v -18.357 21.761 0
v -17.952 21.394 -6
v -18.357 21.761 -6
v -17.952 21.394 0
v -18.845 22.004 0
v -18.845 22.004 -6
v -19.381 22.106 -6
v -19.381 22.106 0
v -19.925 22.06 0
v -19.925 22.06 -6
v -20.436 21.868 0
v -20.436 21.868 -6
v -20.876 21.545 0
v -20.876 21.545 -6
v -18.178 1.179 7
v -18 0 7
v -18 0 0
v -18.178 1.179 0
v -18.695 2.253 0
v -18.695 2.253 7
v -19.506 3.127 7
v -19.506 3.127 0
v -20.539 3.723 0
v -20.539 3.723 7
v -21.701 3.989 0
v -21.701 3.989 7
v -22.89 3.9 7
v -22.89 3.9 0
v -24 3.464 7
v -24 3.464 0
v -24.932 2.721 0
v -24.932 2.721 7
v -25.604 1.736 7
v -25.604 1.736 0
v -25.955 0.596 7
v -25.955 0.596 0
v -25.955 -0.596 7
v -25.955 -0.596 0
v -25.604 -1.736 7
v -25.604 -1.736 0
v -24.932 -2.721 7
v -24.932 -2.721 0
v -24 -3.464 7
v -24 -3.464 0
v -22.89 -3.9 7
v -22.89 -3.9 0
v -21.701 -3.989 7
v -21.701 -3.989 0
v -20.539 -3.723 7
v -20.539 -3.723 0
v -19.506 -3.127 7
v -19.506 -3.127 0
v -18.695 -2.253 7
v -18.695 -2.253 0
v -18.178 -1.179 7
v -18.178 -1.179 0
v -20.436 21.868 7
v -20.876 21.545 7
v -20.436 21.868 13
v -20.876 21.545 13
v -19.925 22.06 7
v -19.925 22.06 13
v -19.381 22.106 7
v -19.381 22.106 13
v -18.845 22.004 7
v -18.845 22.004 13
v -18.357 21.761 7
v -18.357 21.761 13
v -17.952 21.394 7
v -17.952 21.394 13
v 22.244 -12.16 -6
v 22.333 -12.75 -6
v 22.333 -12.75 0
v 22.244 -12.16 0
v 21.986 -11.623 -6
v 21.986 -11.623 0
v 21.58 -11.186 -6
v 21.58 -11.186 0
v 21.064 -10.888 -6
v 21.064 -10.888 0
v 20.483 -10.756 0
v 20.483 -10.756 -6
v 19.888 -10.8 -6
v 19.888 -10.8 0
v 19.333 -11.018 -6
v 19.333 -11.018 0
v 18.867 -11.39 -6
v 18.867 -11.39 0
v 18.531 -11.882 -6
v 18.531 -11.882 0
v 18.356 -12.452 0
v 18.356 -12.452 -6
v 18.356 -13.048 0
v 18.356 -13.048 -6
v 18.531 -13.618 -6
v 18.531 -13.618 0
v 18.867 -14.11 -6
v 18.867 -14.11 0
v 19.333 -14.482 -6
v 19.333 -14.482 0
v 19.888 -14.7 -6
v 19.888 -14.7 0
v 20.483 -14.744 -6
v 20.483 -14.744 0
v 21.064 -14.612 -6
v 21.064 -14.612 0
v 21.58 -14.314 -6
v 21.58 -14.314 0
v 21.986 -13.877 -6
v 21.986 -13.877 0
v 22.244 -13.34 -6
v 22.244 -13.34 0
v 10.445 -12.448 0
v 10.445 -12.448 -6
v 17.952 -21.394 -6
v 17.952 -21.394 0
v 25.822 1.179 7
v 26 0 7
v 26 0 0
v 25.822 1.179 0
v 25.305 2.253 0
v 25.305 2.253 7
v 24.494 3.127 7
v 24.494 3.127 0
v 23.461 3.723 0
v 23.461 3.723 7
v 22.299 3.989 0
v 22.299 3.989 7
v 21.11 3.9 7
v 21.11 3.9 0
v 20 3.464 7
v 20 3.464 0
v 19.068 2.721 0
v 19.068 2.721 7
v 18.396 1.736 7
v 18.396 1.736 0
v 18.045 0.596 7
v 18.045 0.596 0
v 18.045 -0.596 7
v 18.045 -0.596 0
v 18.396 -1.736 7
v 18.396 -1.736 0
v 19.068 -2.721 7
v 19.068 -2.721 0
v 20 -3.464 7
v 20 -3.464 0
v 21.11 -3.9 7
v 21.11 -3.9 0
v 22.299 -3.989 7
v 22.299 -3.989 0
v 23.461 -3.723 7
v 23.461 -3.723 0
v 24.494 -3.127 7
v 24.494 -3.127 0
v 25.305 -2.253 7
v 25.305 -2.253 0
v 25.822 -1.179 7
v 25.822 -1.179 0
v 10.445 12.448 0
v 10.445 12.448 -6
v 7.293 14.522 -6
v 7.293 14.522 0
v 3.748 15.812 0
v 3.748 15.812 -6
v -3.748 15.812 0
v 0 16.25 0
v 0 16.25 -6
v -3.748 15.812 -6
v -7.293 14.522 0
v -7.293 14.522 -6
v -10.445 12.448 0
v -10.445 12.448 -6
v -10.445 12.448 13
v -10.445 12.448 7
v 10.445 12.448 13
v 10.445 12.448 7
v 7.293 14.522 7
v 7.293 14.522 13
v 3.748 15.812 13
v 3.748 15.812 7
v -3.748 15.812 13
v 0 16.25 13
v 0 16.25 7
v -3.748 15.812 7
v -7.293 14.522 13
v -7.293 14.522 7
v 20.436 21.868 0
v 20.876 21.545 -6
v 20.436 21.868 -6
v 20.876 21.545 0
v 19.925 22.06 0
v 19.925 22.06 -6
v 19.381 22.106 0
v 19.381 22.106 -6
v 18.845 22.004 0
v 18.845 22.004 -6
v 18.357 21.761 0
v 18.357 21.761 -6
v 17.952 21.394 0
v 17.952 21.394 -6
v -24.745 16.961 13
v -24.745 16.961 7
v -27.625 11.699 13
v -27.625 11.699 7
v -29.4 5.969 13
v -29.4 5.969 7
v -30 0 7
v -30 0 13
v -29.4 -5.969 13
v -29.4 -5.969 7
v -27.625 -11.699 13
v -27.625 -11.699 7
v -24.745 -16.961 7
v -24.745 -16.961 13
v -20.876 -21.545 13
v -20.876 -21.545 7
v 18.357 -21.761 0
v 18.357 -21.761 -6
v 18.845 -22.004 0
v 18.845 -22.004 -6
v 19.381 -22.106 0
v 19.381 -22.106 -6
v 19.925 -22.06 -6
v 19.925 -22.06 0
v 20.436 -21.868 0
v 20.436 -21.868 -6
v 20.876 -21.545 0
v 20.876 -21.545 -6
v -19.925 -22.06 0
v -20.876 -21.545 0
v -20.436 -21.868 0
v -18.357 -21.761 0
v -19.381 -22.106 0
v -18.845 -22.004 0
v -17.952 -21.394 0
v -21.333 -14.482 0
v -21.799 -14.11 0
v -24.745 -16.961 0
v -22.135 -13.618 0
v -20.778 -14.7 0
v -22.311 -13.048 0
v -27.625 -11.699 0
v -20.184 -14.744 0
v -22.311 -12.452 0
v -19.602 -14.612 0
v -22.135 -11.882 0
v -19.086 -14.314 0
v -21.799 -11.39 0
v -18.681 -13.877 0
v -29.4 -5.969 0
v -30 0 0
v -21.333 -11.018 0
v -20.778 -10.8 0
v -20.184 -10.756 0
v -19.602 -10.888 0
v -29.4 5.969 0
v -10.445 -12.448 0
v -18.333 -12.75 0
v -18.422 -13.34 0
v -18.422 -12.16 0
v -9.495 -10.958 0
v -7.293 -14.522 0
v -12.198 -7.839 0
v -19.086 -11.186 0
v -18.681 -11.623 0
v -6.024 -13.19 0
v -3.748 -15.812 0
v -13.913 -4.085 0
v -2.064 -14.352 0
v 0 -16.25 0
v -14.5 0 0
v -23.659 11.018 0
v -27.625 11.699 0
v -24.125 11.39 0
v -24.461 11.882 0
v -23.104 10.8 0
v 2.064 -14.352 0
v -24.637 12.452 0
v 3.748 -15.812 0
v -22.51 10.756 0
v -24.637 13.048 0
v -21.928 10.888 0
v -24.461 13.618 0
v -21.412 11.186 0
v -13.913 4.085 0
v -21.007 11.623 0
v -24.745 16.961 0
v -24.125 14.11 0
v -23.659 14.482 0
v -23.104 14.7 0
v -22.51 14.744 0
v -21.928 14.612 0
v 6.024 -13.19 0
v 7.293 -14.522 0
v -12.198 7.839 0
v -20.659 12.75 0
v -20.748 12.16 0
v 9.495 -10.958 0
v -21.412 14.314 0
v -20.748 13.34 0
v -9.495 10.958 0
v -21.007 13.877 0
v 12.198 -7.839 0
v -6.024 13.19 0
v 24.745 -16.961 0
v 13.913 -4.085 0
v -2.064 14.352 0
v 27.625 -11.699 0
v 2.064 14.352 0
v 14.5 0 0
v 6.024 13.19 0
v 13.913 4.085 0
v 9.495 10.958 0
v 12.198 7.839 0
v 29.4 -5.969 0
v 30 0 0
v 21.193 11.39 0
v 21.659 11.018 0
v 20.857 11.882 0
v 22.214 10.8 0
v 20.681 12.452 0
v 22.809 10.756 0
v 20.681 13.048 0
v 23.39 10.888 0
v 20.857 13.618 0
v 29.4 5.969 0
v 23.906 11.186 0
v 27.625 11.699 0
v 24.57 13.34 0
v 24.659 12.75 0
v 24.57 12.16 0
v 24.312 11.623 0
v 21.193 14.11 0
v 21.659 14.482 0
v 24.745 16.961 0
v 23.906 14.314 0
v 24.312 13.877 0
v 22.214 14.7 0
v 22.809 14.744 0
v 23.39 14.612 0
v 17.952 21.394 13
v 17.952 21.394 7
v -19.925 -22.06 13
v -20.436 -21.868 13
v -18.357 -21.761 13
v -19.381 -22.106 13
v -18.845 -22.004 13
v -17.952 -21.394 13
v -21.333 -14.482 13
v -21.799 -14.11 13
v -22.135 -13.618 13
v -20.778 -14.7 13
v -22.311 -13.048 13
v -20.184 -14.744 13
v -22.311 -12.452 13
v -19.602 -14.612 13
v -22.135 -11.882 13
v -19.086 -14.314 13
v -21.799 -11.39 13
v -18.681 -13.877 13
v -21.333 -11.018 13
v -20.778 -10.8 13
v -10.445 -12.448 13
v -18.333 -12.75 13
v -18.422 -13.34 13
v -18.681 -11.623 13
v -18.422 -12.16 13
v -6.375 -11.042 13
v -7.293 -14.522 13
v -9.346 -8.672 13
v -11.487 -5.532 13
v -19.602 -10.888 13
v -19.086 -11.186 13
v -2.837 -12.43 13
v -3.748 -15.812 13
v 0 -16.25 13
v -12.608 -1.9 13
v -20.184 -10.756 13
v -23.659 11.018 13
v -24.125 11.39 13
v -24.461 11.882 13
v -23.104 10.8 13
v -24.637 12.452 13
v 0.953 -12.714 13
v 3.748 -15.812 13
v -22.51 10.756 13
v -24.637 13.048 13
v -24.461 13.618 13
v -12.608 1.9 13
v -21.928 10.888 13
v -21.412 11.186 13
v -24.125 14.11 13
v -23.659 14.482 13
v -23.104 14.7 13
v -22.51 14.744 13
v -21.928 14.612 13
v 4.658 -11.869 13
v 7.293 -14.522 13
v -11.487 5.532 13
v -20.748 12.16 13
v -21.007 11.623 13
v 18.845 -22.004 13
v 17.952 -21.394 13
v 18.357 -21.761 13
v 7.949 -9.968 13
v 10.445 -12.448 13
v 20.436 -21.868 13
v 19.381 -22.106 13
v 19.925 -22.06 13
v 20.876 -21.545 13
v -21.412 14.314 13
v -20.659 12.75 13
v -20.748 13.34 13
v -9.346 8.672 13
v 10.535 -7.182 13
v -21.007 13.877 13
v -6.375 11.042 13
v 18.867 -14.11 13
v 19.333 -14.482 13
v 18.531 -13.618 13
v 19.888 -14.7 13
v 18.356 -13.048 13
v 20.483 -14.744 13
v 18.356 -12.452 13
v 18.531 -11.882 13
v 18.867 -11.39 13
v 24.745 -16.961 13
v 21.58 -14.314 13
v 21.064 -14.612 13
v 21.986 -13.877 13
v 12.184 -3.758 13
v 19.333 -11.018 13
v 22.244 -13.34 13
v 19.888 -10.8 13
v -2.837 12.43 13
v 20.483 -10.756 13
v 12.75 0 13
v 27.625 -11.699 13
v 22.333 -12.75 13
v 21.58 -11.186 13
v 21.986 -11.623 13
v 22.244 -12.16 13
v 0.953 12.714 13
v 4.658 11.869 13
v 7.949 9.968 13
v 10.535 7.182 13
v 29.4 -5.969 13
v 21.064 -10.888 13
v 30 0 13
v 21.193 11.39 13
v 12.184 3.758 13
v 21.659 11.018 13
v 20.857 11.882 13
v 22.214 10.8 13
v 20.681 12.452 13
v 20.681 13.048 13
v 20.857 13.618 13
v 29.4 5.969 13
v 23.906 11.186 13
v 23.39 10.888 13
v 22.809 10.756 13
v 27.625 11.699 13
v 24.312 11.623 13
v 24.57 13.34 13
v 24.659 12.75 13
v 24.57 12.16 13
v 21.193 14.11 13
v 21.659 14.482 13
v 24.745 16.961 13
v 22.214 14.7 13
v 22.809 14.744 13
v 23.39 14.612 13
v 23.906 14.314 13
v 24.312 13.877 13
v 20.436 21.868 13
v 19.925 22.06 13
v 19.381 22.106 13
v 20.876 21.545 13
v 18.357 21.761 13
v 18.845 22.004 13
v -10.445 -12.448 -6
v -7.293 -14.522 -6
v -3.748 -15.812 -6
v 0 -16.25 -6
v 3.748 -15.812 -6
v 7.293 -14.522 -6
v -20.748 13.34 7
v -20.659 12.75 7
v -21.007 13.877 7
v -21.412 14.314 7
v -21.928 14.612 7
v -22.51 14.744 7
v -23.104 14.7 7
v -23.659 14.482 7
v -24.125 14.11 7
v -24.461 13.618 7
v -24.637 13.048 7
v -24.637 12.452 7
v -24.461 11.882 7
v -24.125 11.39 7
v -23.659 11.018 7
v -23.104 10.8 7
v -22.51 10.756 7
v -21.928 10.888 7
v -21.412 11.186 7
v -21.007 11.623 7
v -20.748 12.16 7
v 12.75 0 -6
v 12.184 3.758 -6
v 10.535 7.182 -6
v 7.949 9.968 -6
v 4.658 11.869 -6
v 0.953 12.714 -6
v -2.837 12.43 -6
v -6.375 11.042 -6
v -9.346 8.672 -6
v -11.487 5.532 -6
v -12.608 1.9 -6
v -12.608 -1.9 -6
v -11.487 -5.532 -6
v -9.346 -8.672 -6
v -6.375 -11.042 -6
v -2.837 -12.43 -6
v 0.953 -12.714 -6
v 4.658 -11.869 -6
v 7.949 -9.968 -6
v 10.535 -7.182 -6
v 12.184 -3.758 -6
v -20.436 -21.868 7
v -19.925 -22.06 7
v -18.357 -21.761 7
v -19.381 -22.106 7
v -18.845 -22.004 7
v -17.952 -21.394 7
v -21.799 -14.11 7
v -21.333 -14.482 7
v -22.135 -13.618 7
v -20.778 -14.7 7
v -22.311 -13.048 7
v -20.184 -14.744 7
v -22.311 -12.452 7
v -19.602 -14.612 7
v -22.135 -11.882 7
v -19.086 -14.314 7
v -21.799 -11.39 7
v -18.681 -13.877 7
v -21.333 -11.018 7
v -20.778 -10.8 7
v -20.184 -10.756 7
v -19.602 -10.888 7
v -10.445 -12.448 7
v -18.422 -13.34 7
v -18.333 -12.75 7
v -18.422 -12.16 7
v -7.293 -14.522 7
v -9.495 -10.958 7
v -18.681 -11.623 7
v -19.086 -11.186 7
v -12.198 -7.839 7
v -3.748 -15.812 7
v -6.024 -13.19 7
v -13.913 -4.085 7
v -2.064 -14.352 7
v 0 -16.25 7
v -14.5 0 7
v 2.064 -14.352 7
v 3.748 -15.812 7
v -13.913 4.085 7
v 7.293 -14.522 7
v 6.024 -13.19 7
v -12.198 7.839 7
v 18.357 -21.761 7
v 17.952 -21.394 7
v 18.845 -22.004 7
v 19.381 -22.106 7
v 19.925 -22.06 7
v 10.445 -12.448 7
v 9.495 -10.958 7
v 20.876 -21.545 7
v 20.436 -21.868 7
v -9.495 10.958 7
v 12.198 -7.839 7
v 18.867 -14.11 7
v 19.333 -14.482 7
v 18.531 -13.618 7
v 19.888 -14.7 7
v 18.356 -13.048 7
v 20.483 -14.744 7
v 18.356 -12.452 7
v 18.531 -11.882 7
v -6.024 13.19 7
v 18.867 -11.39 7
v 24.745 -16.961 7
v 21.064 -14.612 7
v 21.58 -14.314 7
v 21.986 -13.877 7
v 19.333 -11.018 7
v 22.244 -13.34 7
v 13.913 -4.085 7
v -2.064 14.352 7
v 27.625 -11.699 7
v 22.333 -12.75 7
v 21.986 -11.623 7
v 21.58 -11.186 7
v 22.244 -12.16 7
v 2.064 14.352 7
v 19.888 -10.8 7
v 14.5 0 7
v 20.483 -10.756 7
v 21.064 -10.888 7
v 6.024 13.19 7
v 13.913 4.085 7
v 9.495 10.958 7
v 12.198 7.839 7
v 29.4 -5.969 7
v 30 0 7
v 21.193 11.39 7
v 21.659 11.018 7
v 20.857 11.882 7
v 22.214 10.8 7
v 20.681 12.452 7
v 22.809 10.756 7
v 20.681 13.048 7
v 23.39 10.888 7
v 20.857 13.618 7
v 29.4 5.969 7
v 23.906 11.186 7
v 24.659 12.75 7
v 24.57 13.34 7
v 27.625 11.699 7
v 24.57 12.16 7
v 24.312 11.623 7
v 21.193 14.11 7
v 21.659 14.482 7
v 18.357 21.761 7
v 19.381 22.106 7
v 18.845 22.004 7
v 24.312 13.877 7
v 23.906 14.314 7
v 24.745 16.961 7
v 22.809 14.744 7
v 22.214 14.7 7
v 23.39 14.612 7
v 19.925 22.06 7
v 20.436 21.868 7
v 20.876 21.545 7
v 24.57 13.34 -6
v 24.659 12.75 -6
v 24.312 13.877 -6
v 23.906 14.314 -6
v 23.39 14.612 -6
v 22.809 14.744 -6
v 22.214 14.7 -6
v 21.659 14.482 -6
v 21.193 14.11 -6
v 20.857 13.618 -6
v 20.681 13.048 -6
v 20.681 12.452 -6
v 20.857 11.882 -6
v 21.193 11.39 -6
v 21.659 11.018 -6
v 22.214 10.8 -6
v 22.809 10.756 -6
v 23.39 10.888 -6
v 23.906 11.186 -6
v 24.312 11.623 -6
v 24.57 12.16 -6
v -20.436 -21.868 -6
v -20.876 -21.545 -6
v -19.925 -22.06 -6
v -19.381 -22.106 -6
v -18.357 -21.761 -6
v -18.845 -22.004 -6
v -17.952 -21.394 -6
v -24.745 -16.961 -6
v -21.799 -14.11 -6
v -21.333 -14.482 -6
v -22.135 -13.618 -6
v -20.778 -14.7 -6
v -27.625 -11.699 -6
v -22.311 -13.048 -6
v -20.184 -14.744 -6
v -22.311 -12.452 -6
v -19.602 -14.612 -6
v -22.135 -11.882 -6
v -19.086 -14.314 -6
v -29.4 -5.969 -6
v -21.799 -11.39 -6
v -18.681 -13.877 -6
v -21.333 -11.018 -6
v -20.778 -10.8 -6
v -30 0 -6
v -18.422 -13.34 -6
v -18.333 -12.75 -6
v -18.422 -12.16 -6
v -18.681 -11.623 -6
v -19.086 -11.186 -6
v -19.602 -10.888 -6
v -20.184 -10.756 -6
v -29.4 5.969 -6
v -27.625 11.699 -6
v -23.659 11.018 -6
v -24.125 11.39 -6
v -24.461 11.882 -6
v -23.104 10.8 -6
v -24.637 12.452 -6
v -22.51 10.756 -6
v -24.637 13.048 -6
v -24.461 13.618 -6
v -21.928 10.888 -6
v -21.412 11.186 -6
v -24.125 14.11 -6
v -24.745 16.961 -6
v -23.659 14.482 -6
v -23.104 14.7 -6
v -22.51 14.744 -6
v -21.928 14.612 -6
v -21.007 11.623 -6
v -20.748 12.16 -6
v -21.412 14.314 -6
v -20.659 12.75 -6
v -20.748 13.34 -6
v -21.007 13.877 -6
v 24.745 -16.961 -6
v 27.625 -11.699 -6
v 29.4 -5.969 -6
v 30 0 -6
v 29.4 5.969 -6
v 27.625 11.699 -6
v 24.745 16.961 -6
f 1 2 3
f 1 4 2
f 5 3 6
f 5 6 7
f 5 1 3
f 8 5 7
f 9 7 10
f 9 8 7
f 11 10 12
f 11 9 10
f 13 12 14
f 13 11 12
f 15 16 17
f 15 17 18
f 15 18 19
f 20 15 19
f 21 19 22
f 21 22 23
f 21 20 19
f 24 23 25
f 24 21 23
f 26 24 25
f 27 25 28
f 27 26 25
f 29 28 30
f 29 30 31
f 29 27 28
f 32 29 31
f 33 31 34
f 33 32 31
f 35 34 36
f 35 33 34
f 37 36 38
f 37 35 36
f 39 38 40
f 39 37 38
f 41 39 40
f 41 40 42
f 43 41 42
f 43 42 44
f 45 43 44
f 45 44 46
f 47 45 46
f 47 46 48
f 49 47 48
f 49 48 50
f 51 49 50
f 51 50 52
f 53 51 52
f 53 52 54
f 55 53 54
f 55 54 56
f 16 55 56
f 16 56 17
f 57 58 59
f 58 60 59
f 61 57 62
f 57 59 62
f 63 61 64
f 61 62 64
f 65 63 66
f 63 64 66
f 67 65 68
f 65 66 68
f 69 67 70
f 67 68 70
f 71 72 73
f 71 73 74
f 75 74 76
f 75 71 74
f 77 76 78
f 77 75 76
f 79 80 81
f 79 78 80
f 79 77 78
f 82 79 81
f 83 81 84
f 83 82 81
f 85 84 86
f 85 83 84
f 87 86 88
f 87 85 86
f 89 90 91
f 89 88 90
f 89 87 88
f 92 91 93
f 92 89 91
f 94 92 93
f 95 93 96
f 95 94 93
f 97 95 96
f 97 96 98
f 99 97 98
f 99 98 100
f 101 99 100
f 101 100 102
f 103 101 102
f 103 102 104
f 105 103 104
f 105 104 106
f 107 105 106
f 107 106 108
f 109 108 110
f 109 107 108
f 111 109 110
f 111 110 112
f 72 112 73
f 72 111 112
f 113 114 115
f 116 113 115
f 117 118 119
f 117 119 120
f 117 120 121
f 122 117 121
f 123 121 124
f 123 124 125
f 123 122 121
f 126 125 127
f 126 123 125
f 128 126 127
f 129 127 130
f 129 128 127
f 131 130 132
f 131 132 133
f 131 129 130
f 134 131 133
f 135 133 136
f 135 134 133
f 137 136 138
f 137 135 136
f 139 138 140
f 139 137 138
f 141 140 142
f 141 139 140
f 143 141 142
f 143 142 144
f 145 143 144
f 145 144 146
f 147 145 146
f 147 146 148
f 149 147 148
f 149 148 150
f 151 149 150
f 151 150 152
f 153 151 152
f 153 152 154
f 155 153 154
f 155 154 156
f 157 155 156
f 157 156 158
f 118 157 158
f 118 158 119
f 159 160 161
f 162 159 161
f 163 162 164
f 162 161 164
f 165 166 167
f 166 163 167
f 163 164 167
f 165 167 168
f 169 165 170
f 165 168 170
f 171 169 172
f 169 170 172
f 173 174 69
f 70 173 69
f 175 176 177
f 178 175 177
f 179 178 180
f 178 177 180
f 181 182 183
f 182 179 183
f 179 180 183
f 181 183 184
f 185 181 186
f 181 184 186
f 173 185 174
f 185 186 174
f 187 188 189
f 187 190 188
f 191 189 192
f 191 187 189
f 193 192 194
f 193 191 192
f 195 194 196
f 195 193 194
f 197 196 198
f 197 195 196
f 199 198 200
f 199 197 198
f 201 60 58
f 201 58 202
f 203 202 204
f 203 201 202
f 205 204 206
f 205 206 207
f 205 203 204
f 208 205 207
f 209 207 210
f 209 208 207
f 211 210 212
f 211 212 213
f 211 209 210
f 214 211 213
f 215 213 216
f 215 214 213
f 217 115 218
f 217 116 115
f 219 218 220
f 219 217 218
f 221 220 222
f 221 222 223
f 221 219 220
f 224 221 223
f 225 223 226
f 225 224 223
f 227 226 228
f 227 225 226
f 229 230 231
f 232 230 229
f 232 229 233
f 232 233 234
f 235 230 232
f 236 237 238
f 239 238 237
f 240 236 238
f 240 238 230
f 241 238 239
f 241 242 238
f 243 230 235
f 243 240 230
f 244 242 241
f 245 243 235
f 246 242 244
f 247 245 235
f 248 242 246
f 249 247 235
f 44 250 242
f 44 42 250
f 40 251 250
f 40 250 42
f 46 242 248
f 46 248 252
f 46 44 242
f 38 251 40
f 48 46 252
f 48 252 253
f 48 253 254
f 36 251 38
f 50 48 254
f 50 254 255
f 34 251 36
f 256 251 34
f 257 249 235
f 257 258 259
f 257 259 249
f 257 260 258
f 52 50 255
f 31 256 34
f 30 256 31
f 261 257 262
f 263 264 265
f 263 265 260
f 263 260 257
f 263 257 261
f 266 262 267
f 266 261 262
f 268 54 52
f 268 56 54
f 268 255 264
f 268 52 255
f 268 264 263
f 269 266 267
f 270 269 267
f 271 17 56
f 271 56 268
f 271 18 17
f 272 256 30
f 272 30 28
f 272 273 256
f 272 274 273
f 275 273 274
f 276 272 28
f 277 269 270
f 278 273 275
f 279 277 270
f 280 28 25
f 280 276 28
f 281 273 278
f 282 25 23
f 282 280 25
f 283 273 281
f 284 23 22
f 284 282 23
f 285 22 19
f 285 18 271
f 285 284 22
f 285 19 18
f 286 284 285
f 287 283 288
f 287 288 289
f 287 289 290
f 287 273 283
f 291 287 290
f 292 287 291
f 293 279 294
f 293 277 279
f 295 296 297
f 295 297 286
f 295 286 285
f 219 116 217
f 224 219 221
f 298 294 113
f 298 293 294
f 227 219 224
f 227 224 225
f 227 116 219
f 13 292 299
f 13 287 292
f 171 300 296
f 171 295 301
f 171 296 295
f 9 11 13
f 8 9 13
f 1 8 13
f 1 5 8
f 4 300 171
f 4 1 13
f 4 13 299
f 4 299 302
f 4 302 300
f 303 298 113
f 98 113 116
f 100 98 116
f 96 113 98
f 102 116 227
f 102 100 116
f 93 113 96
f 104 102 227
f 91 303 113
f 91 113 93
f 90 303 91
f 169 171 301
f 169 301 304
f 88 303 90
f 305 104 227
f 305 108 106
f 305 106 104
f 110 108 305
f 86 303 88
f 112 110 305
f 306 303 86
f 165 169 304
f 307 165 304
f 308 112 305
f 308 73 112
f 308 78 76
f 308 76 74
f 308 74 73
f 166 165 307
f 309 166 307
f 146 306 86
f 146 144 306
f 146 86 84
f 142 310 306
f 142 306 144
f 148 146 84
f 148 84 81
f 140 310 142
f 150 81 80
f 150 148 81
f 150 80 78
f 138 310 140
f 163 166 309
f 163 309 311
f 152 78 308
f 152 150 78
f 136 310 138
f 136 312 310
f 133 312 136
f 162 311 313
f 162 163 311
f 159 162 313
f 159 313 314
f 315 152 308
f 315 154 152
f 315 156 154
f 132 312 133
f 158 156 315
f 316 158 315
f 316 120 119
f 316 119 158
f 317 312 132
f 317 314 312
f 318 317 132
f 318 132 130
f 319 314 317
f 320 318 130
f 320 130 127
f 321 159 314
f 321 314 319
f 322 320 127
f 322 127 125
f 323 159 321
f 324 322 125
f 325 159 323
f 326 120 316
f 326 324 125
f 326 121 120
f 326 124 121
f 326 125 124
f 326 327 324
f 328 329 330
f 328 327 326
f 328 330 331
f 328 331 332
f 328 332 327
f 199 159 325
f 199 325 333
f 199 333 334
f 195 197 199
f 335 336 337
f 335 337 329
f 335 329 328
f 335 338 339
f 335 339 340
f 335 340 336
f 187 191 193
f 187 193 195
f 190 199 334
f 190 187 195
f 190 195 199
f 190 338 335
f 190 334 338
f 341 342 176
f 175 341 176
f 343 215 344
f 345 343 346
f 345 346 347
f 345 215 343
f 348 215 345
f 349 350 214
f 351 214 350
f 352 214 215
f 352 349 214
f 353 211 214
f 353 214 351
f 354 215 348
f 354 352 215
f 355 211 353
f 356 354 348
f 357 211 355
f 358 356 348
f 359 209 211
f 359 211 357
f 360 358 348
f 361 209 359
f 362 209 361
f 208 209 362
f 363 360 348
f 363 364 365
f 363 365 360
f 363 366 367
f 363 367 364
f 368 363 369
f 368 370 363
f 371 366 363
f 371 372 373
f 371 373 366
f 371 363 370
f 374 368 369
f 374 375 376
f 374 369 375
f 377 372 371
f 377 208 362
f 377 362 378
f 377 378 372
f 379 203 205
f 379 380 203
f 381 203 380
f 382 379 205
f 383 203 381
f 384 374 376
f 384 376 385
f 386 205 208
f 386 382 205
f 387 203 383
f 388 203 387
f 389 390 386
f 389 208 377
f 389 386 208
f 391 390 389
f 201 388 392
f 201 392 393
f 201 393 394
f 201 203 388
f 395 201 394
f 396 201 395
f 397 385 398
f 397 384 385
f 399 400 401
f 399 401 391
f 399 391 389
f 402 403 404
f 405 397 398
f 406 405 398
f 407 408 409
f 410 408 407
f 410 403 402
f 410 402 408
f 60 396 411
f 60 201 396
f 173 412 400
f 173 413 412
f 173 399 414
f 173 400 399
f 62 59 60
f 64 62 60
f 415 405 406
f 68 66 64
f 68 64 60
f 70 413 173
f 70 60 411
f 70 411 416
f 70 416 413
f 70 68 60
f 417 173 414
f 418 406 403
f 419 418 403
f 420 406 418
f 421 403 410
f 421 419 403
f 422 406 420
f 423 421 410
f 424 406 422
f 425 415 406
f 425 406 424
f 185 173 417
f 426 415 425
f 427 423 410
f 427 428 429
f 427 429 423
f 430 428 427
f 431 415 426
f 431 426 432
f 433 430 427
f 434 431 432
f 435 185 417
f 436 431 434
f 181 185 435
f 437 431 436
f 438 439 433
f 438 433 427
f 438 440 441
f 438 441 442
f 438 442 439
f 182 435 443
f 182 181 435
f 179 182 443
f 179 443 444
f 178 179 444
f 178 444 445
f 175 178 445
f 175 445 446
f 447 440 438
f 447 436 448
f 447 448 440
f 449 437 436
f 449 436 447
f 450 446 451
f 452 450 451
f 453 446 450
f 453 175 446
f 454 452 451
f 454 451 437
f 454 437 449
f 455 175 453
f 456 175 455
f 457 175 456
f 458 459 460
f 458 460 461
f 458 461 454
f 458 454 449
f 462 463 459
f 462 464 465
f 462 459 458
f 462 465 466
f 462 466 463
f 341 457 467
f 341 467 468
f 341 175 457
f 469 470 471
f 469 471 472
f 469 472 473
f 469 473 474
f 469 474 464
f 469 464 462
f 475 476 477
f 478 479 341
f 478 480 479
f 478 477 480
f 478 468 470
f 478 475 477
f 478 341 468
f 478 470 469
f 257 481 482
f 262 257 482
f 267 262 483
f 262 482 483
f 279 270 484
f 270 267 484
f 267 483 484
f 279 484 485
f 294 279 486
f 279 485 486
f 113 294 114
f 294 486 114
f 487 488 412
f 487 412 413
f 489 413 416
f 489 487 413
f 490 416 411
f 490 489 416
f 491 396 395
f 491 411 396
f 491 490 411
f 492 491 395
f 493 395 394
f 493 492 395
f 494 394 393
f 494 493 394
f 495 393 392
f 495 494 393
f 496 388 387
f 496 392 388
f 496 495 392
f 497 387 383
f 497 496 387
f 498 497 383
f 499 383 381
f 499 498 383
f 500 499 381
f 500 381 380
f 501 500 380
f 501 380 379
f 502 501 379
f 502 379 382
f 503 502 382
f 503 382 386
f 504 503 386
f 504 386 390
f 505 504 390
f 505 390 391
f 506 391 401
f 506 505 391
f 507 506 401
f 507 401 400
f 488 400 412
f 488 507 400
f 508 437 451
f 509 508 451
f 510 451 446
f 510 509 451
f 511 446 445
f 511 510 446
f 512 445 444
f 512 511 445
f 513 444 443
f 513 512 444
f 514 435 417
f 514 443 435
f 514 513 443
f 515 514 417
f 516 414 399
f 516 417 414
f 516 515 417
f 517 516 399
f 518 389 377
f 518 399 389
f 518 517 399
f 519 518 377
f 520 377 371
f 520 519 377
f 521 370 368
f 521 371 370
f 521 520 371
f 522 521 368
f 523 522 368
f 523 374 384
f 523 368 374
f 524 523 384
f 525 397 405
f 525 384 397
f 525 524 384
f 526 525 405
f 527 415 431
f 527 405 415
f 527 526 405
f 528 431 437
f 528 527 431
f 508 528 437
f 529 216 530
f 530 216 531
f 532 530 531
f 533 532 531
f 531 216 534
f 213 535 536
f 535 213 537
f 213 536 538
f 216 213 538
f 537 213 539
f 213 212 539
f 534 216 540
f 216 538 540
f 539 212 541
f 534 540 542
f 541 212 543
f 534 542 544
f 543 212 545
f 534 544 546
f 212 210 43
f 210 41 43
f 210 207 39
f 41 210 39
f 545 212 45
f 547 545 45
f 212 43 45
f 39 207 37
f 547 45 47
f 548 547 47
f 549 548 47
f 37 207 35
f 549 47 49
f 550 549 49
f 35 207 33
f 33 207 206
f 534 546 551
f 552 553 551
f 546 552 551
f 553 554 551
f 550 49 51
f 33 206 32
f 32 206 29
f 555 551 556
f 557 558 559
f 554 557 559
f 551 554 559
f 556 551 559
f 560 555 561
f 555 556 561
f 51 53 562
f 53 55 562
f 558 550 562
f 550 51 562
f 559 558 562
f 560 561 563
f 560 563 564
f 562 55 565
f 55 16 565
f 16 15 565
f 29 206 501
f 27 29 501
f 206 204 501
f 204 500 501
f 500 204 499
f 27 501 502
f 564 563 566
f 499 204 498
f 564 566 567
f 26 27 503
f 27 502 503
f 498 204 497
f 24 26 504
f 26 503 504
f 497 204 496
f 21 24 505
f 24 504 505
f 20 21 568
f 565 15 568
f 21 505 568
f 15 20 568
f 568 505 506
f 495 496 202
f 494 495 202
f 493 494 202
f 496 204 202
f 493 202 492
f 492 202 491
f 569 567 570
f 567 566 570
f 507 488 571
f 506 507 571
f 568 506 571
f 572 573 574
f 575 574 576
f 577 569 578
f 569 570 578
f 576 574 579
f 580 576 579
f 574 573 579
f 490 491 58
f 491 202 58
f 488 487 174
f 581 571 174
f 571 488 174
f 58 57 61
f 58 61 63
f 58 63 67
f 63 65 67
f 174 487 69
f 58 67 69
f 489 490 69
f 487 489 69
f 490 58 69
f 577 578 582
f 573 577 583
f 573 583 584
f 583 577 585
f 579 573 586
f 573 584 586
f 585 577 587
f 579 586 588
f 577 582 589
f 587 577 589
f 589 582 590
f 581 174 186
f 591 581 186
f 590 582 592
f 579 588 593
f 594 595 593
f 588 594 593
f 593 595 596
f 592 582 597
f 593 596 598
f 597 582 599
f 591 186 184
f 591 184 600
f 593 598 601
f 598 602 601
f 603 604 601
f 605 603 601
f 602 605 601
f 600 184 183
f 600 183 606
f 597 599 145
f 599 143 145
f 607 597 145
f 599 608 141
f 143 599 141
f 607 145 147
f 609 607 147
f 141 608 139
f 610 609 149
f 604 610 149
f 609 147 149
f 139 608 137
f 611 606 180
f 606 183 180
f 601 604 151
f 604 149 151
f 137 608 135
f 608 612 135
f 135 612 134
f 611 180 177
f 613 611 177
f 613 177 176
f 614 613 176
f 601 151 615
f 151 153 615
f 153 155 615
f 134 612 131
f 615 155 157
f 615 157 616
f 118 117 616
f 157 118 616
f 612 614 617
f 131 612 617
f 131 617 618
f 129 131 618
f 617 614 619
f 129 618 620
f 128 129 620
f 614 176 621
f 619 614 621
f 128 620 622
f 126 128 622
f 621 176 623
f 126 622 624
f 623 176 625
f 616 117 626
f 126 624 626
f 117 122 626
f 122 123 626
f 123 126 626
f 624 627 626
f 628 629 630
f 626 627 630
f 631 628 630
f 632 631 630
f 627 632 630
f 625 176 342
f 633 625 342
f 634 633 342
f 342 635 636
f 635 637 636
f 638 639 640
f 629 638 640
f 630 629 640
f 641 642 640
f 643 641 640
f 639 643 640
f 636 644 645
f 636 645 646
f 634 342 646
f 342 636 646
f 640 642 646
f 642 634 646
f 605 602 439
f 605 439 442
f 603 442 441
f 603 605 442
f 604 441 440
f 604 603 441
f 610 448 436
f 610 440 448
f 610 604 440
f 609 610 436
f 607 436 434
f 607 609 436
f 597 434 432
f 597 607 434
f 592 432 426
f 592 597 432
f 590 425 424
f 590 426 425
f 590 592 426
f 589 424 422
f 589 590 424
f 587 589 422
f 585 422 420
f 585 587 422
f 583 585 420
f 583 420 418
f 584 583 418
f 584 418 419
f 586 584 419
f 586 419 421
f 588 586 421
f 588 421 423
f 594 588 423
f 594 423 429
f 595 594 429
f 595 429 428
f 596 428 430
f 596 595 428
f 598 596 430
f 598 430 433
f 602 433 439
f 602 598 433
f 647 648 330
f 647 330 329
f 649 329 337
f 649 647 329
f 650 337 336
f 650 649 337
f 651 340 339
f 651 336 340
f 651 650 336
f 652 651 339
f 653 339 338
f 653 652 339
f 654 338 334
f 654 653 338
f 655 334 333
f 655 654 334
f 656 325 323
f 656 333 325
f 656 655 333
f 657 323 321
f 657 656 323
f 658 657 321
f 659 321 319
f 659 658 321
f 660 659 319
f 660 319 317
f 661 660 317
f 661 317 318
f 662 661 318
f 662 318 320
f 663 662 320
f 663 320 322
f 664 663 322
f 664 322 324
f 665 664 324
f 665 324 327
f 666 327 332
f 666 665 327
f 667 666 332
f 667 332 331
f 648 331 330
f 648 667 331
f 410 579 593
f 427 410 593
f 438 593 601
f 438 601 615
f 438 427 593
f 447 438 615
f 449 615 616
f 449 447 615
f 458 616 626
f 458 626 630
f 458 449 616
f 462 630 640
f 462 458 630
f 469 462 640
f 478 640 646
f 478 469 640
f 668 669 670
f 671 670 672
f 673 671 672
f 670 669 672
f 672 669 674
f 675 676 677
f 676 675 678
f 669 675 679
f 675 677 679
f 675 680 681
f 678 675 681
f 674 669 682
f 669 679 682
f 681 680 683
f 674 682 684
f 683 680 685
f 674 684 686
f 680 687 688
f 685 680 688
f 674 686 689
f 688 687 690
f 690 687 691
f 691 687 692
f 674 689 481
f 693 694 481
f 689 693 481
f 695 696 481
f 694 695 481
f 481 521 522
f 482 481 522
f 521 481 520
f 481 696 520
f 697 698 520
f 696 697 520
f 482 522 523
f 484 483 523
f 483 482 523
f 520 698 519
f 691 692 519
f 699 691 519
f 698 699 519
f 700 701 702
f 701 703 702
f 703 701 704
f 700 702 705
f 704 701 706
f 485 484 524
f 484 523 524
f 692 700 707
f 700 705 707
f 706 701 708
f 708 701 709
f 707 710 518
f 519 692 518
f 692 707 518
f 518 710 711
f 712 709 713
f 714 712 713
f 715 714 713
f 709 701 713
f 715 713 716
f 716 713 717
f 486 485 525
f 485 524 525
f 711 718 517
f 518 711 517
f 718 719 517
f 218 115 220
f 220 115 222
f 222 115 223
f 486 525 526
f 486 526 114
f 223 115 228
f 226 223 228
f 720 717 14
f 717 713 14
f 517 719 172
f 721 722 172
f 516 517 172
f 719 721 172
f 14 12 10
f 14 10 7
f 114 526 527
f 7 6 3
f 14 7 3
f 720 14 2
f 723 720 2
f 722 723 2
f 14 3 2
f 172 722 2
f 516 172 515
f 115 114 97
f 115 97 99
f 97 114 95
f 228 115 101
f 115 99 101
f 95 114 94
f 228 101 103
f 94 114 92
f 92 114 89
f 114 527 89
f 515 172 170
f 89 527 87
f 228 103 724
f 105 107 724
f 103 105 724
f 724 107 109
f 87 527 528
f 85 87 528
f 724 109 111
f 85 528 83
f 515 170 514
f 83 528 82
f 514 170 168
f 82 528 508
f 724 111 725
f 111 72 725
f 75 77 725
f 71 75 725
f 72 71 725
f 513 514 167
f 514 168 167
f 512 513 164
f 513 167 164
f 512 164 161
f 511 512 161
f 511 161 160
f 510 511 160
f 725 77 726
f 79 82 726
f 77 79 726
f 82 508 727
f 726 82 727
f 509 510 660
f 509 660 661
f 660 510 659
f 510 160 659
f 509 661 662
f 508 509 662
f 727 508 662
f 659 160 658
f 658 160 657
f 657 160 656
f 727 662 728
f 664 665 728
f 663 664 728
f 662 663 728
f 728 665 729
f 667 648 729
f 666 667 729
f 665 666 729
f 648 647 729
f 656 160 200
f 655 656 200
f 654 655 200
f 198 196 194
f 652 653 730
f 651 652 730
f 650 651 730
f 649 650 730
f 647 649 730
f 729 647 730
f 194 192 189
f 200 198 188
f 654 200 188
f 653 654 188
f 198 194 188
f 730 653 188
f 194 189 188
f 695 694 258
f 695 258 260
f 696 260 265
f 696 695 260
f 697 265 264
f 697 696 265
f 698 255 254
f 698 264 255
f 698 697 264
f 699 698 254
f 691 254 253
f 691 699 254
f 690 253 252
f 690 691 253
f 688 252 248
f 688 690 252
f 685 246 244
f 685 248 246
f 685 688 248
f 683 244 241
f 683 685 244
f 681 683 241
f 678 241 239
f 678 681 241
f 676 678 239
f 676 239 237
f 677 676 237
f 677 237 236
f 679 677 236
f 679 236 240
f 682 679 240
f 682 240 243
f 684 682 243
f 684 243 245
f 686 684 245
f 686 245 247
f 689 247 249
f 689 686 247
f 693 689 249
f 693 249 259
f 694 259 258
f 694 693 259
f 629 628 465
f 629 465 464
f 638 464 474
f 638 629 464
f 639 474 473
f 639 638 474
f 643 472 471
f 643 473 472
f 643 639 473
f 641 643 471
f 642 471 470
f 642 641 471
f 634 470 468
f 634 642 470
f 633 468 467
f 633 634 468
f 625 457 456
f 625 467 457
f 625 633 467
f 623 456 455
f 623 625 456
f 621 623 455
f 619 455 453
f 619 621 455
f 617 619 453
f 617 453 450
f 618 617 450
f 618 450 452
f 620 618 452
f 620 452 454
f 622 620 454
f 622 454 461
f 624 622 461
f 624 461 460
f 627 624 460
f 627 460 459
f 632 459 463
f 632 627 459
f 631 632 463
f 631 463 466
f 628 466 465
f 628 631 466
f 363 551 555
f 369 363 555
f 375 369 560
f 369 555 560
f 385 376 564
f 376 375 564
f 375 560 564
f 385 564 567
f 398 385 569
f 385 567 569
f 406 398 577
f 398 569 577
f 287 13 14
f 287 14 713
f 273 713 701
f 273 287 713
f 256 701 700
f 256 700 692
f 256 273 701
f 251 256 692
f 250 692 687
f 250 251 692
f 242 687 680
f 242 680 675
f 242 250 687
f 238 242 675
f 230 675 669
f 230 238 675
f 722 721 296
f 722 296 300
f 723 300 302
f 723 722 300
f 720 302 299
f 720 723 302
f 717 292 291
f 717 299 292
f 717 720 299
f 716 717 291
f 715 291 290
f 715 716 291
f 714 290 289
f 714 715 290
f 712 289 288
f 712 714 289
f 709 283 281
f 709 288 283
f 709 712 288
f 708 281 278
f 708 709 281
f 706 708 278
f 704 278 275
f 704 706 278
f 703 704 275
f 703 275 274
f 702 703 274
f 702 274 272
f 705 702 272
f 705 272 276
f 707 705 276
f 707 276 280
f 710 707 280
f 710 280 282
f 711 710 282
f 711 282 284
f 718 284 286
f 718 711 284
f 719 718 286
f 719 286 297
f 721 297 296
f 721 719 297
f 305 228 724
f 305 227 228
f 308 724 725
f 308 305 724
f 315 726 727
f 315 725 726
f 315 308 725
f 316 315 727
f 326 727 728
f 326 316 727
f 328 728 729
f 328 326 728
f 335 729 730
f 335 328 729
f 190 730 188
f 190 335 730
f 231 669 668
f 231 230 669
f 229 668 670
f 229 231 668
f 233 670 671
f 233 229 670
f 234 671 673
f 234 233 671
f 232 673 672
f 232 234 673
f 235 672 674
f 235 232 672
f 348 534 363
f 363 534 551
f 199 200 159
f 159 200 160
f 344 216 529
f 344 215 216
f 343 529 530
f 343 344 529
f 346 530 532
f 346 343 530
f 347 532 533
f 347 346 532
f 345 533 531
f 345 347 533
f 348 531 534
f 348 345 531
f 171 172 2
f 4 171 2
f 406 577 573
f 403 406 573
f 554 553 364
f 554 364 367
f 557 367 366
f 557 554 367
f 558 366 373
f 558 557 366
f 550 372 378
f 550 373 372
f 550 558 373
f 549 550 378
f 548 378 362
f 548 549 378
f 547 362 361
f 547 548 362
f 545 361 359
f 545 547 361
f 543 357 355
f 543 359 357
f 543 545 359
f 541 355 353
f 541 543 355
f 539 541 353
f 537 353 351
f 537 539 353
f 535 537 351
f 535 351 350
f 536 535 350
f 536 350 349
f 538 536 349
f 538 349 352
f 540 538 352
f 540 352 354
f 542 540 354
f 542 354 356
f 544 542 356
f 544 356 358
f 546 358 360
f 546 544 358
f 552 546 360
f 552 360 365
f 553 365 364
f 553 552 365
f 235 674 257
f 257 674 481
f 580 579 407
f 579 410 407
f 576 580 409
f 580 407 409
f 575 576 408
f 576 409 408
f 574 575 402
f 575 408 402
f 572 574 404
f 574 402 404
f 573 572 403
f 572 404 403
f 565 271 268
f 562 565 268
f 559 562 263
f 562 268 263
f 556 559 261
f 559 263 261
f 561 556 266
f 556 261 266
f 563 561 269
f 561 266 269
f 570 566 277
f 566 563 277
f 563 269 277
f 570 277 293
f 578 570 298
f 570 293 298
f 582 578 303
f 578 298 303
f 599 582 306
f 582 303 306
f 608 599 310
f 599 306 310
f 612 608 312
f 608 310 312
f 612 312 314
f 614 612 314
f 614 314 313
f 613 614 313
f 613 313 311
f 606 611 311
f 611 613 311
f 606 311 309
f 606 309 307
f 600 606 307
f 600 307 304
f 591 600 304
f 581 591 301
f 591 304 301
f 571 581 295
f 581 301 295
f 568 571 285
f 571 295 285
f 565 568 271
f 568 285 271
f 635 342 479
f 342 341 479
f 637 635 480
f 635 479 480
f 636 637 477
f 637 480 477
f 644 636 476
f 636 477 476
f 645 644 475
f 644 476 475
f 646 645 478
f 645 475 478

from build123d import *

# Parameters (mm, degrees)
SKETCH1_R               = 30
BOSS_EXTRUDE1_DEPTH     = 6
SKETCH2_R               = 14.5
BOSS_EXTRUDE2_DEPTH     = 13
CUT_EXTRUDE1_DEPTH      = 47.486557197
CUT_EXTRUDE1_DEPTH_BACK = 47.486557197
SKETCH3_R               = 12.75
BOSS_EXTRUDE4_START     = 13
SKETCH5_R               = 30
SKETCH5_R_2             = 12.75
BOSS_EXTRUDE4_DEPTH     = 6
CUT_EXTRUDE2_DEPTH      = 45.373415465
CUT_EXTRUDE2_DEPTH_BACK = 45.373415465
SKETCH6_R               = 2
CUT_EXTRUDE3_DEPTH      = 47.486557197
CUT_EXTRUDE3_DEPTH_BACK = 47.486557197
FILLET1_R               = 2
FILLET2_R               = 2
FILLET3_R               = 2
FILLET4_R               = 2
SKETCH8_R               = 4
BOSS_EXTRUDE5_DEPTH     = 13
FILLET5_R               = 2
FILLET6_R               = 2
FILLET7_R               = 2
FILLET8_R               = 2


with BuildPart() as part:
    # Sketch1 → Boss-Extrude1 (new body)
    with BuildSketch(Plane.XY):
        Circle(SKETCH1_R)
    extrude(amount=-BOSS_EXTRUDE1_DEPTH)

    # Sketch2 → Boss-Extrude2 (add)
    with BuildSketch(Plane.XY):
        with Locations(Location((0, 0, 0), (0, 0, 180))):
            Circle(SKETCH2_R)
    extrude(amount=BOSS_EXTRUDE2_DEPTH)

    # Sketch3 → Cut-Extrude1 (cut, two sides: drawn at the far end of the back side and taken through both)
    with BuildSketch(Plane.XY.offset(13).offset(-CUT_EXTRUDE1_DEPTH_BACK)):
        Circle(SKETCH3_R)
    extrude(amount=CUT_EXTRUDE1_DEPTH + CUT_EXTRUDE1_DEPTH_BACK, mode=Mode.SUBTRACT)

    # Sketch5 → Boss-Extrude4 (add)
    with BuildSketch(Plane.XY.offset(BOSS_EXTRUDE4_START)):
        Circle(SKETCH5_R)
        Circle(SKETCH5_R_2, mode=Mode.SUBTRACT)
    extrude(amount=-BOSS_EXTRUDE4_DEPTH)

    # Sketch6 → Cut-Extrude2 (cut, two sides: drawn at the far end of the back side and taken through both)
    with BuildSketch(Plane.XY.offset(-CUT_EXTRUDE2_DEPTH_BACK)):
        with Locations((-20.333162568, -12.75)):
            Circle(SKETCH6_R)
        with Locations((-22.659159296, 12.75)):
            Circle(SKETCH6_R)
        with Locations((20.333162568, -12.75)):
            Circle(SKETCH6_R)
        with Locations((22.659159296, 12.75)):
            Circle(SKETCH6_R)
    extrude(amount=CUT_EXTRUDE2_DEPTH + CUT_EXTRUDE2_DEPTH_BACK, mode=Mode.SUBTRACT)

    # Sketch7 → Cut-Extrude3 (cut, two sides: drawn at the far end of the back side and taken through both)
    with BuildSketch(Plane.XY.offset(13).offset(-CUT_EXTRUDE3_DEPTH_BACK)):
        with BuildLine():
            Line((10.445298657, -12.448222201), (19.283628291, -22.981333294))
            ThreePointArc((19.283628291, -22.981333294), (0, -30), (-19.283628291, -22.981333294))
            Line((-19.283628291, -22.981333294), (-10.445298657, -12.448222201))
            ThreePointArc((-10.445298657, -12.448222201), (0, -16.25), (10.445298657, -12.448222201))
        make_face()
        with BuildLine():
            Line((-10.445298657, 12.448222201), (-19.283628291, 22.981333294))
            ThreePointArc((-19.283628291, 22.981333294), (0, 30), (19.283628291, 22.981333294))
            Line((19.283628291, 22.981333294), (10.445298657, 12.448222201))
            ThreePointArc((10.445298657, 12.448222201), (0, 16.25), (-10.445298657, 12.448222201))
        make_face()
    extrude(amount=CUT_EXTRUDE3_DEPTH + CUT_EXTRUDE3_DEPTH_BACK, mode=Mode.SUBTRACT)

    # Fillet1
    fillet1_edges = [part.edges().sort_by_distance(p)[0] for p in [
        (-19.283628291, -22.981333294, 10),
    ]]
    fillet(fillet1_edges, radius=FILLET1_R)

    # Fillet2
    fillet2_edges = [part.edges().sort_by_distance(p)[0] for p in [
        (-19.283628291, 22.981333294, 10),
    ]]
    fillet(fillet2_edges, radius=FILLET2_R)

    # Fillet3
    fillet3_edges = [part.edges().sort_by_distance(p)[0] for p in [
        (19.283628291, 22.981333294, 10),
    ]]
    fillet(fillet3_edges, radius=FILLET3_R)

    # Fillet4
    fillet4_edges = [part.edges().sort_by_distance(p)[0] for p in [
        (19.283628291, -22.981333294, 10),
    ]]
    fillet(fillet4_edges, radius=FILLET4_R)

    # Sketch8 → Boss-Extrude5 (add)
    with BuildSketch(Plane.XY.offset(13)):
        with Locations((-22, 0)):
            Circle(SKETCH8_R)
        with Locations((22, 0)):
            Circle(SKETCH8_R)
    extrude(amount=-BOSS_EXTRUDE5_DEPTH)

    # Fillet5
    fillet5_edges = [part.edges().sort_by_distance(p)[0] for p in [
        (-19.283628291, 22.981333294, -3),
    ]]
    fillet(fillet5_edges, radius=FILLET5_R)

    # Fillet6
    fillet6_edges = [part.edges().sort_by_distance(p)[0] for p in [
        (-19.283628291, -22.981333294, -3),
    ]]
    fillet(fillet6_edges, radius=FILLET6_R)

    # Fillet7
    fillet7_edges = [part.edges().sort_by_distance(p)[0] for p in [
        (19.283628291, -22.981333294, -3),
    ]]
    fillet(fillet7_edges, radius=FILLET7_R)

    # Fillet8
    fillet8_edges = [part.edges().sort_by_distance(p)[0] for p in [
        (19.283628291, 22.981333294, -3),
    ]]
    fillet(fillet8_edges, radius=FILLET8_R)


solid = part.part
